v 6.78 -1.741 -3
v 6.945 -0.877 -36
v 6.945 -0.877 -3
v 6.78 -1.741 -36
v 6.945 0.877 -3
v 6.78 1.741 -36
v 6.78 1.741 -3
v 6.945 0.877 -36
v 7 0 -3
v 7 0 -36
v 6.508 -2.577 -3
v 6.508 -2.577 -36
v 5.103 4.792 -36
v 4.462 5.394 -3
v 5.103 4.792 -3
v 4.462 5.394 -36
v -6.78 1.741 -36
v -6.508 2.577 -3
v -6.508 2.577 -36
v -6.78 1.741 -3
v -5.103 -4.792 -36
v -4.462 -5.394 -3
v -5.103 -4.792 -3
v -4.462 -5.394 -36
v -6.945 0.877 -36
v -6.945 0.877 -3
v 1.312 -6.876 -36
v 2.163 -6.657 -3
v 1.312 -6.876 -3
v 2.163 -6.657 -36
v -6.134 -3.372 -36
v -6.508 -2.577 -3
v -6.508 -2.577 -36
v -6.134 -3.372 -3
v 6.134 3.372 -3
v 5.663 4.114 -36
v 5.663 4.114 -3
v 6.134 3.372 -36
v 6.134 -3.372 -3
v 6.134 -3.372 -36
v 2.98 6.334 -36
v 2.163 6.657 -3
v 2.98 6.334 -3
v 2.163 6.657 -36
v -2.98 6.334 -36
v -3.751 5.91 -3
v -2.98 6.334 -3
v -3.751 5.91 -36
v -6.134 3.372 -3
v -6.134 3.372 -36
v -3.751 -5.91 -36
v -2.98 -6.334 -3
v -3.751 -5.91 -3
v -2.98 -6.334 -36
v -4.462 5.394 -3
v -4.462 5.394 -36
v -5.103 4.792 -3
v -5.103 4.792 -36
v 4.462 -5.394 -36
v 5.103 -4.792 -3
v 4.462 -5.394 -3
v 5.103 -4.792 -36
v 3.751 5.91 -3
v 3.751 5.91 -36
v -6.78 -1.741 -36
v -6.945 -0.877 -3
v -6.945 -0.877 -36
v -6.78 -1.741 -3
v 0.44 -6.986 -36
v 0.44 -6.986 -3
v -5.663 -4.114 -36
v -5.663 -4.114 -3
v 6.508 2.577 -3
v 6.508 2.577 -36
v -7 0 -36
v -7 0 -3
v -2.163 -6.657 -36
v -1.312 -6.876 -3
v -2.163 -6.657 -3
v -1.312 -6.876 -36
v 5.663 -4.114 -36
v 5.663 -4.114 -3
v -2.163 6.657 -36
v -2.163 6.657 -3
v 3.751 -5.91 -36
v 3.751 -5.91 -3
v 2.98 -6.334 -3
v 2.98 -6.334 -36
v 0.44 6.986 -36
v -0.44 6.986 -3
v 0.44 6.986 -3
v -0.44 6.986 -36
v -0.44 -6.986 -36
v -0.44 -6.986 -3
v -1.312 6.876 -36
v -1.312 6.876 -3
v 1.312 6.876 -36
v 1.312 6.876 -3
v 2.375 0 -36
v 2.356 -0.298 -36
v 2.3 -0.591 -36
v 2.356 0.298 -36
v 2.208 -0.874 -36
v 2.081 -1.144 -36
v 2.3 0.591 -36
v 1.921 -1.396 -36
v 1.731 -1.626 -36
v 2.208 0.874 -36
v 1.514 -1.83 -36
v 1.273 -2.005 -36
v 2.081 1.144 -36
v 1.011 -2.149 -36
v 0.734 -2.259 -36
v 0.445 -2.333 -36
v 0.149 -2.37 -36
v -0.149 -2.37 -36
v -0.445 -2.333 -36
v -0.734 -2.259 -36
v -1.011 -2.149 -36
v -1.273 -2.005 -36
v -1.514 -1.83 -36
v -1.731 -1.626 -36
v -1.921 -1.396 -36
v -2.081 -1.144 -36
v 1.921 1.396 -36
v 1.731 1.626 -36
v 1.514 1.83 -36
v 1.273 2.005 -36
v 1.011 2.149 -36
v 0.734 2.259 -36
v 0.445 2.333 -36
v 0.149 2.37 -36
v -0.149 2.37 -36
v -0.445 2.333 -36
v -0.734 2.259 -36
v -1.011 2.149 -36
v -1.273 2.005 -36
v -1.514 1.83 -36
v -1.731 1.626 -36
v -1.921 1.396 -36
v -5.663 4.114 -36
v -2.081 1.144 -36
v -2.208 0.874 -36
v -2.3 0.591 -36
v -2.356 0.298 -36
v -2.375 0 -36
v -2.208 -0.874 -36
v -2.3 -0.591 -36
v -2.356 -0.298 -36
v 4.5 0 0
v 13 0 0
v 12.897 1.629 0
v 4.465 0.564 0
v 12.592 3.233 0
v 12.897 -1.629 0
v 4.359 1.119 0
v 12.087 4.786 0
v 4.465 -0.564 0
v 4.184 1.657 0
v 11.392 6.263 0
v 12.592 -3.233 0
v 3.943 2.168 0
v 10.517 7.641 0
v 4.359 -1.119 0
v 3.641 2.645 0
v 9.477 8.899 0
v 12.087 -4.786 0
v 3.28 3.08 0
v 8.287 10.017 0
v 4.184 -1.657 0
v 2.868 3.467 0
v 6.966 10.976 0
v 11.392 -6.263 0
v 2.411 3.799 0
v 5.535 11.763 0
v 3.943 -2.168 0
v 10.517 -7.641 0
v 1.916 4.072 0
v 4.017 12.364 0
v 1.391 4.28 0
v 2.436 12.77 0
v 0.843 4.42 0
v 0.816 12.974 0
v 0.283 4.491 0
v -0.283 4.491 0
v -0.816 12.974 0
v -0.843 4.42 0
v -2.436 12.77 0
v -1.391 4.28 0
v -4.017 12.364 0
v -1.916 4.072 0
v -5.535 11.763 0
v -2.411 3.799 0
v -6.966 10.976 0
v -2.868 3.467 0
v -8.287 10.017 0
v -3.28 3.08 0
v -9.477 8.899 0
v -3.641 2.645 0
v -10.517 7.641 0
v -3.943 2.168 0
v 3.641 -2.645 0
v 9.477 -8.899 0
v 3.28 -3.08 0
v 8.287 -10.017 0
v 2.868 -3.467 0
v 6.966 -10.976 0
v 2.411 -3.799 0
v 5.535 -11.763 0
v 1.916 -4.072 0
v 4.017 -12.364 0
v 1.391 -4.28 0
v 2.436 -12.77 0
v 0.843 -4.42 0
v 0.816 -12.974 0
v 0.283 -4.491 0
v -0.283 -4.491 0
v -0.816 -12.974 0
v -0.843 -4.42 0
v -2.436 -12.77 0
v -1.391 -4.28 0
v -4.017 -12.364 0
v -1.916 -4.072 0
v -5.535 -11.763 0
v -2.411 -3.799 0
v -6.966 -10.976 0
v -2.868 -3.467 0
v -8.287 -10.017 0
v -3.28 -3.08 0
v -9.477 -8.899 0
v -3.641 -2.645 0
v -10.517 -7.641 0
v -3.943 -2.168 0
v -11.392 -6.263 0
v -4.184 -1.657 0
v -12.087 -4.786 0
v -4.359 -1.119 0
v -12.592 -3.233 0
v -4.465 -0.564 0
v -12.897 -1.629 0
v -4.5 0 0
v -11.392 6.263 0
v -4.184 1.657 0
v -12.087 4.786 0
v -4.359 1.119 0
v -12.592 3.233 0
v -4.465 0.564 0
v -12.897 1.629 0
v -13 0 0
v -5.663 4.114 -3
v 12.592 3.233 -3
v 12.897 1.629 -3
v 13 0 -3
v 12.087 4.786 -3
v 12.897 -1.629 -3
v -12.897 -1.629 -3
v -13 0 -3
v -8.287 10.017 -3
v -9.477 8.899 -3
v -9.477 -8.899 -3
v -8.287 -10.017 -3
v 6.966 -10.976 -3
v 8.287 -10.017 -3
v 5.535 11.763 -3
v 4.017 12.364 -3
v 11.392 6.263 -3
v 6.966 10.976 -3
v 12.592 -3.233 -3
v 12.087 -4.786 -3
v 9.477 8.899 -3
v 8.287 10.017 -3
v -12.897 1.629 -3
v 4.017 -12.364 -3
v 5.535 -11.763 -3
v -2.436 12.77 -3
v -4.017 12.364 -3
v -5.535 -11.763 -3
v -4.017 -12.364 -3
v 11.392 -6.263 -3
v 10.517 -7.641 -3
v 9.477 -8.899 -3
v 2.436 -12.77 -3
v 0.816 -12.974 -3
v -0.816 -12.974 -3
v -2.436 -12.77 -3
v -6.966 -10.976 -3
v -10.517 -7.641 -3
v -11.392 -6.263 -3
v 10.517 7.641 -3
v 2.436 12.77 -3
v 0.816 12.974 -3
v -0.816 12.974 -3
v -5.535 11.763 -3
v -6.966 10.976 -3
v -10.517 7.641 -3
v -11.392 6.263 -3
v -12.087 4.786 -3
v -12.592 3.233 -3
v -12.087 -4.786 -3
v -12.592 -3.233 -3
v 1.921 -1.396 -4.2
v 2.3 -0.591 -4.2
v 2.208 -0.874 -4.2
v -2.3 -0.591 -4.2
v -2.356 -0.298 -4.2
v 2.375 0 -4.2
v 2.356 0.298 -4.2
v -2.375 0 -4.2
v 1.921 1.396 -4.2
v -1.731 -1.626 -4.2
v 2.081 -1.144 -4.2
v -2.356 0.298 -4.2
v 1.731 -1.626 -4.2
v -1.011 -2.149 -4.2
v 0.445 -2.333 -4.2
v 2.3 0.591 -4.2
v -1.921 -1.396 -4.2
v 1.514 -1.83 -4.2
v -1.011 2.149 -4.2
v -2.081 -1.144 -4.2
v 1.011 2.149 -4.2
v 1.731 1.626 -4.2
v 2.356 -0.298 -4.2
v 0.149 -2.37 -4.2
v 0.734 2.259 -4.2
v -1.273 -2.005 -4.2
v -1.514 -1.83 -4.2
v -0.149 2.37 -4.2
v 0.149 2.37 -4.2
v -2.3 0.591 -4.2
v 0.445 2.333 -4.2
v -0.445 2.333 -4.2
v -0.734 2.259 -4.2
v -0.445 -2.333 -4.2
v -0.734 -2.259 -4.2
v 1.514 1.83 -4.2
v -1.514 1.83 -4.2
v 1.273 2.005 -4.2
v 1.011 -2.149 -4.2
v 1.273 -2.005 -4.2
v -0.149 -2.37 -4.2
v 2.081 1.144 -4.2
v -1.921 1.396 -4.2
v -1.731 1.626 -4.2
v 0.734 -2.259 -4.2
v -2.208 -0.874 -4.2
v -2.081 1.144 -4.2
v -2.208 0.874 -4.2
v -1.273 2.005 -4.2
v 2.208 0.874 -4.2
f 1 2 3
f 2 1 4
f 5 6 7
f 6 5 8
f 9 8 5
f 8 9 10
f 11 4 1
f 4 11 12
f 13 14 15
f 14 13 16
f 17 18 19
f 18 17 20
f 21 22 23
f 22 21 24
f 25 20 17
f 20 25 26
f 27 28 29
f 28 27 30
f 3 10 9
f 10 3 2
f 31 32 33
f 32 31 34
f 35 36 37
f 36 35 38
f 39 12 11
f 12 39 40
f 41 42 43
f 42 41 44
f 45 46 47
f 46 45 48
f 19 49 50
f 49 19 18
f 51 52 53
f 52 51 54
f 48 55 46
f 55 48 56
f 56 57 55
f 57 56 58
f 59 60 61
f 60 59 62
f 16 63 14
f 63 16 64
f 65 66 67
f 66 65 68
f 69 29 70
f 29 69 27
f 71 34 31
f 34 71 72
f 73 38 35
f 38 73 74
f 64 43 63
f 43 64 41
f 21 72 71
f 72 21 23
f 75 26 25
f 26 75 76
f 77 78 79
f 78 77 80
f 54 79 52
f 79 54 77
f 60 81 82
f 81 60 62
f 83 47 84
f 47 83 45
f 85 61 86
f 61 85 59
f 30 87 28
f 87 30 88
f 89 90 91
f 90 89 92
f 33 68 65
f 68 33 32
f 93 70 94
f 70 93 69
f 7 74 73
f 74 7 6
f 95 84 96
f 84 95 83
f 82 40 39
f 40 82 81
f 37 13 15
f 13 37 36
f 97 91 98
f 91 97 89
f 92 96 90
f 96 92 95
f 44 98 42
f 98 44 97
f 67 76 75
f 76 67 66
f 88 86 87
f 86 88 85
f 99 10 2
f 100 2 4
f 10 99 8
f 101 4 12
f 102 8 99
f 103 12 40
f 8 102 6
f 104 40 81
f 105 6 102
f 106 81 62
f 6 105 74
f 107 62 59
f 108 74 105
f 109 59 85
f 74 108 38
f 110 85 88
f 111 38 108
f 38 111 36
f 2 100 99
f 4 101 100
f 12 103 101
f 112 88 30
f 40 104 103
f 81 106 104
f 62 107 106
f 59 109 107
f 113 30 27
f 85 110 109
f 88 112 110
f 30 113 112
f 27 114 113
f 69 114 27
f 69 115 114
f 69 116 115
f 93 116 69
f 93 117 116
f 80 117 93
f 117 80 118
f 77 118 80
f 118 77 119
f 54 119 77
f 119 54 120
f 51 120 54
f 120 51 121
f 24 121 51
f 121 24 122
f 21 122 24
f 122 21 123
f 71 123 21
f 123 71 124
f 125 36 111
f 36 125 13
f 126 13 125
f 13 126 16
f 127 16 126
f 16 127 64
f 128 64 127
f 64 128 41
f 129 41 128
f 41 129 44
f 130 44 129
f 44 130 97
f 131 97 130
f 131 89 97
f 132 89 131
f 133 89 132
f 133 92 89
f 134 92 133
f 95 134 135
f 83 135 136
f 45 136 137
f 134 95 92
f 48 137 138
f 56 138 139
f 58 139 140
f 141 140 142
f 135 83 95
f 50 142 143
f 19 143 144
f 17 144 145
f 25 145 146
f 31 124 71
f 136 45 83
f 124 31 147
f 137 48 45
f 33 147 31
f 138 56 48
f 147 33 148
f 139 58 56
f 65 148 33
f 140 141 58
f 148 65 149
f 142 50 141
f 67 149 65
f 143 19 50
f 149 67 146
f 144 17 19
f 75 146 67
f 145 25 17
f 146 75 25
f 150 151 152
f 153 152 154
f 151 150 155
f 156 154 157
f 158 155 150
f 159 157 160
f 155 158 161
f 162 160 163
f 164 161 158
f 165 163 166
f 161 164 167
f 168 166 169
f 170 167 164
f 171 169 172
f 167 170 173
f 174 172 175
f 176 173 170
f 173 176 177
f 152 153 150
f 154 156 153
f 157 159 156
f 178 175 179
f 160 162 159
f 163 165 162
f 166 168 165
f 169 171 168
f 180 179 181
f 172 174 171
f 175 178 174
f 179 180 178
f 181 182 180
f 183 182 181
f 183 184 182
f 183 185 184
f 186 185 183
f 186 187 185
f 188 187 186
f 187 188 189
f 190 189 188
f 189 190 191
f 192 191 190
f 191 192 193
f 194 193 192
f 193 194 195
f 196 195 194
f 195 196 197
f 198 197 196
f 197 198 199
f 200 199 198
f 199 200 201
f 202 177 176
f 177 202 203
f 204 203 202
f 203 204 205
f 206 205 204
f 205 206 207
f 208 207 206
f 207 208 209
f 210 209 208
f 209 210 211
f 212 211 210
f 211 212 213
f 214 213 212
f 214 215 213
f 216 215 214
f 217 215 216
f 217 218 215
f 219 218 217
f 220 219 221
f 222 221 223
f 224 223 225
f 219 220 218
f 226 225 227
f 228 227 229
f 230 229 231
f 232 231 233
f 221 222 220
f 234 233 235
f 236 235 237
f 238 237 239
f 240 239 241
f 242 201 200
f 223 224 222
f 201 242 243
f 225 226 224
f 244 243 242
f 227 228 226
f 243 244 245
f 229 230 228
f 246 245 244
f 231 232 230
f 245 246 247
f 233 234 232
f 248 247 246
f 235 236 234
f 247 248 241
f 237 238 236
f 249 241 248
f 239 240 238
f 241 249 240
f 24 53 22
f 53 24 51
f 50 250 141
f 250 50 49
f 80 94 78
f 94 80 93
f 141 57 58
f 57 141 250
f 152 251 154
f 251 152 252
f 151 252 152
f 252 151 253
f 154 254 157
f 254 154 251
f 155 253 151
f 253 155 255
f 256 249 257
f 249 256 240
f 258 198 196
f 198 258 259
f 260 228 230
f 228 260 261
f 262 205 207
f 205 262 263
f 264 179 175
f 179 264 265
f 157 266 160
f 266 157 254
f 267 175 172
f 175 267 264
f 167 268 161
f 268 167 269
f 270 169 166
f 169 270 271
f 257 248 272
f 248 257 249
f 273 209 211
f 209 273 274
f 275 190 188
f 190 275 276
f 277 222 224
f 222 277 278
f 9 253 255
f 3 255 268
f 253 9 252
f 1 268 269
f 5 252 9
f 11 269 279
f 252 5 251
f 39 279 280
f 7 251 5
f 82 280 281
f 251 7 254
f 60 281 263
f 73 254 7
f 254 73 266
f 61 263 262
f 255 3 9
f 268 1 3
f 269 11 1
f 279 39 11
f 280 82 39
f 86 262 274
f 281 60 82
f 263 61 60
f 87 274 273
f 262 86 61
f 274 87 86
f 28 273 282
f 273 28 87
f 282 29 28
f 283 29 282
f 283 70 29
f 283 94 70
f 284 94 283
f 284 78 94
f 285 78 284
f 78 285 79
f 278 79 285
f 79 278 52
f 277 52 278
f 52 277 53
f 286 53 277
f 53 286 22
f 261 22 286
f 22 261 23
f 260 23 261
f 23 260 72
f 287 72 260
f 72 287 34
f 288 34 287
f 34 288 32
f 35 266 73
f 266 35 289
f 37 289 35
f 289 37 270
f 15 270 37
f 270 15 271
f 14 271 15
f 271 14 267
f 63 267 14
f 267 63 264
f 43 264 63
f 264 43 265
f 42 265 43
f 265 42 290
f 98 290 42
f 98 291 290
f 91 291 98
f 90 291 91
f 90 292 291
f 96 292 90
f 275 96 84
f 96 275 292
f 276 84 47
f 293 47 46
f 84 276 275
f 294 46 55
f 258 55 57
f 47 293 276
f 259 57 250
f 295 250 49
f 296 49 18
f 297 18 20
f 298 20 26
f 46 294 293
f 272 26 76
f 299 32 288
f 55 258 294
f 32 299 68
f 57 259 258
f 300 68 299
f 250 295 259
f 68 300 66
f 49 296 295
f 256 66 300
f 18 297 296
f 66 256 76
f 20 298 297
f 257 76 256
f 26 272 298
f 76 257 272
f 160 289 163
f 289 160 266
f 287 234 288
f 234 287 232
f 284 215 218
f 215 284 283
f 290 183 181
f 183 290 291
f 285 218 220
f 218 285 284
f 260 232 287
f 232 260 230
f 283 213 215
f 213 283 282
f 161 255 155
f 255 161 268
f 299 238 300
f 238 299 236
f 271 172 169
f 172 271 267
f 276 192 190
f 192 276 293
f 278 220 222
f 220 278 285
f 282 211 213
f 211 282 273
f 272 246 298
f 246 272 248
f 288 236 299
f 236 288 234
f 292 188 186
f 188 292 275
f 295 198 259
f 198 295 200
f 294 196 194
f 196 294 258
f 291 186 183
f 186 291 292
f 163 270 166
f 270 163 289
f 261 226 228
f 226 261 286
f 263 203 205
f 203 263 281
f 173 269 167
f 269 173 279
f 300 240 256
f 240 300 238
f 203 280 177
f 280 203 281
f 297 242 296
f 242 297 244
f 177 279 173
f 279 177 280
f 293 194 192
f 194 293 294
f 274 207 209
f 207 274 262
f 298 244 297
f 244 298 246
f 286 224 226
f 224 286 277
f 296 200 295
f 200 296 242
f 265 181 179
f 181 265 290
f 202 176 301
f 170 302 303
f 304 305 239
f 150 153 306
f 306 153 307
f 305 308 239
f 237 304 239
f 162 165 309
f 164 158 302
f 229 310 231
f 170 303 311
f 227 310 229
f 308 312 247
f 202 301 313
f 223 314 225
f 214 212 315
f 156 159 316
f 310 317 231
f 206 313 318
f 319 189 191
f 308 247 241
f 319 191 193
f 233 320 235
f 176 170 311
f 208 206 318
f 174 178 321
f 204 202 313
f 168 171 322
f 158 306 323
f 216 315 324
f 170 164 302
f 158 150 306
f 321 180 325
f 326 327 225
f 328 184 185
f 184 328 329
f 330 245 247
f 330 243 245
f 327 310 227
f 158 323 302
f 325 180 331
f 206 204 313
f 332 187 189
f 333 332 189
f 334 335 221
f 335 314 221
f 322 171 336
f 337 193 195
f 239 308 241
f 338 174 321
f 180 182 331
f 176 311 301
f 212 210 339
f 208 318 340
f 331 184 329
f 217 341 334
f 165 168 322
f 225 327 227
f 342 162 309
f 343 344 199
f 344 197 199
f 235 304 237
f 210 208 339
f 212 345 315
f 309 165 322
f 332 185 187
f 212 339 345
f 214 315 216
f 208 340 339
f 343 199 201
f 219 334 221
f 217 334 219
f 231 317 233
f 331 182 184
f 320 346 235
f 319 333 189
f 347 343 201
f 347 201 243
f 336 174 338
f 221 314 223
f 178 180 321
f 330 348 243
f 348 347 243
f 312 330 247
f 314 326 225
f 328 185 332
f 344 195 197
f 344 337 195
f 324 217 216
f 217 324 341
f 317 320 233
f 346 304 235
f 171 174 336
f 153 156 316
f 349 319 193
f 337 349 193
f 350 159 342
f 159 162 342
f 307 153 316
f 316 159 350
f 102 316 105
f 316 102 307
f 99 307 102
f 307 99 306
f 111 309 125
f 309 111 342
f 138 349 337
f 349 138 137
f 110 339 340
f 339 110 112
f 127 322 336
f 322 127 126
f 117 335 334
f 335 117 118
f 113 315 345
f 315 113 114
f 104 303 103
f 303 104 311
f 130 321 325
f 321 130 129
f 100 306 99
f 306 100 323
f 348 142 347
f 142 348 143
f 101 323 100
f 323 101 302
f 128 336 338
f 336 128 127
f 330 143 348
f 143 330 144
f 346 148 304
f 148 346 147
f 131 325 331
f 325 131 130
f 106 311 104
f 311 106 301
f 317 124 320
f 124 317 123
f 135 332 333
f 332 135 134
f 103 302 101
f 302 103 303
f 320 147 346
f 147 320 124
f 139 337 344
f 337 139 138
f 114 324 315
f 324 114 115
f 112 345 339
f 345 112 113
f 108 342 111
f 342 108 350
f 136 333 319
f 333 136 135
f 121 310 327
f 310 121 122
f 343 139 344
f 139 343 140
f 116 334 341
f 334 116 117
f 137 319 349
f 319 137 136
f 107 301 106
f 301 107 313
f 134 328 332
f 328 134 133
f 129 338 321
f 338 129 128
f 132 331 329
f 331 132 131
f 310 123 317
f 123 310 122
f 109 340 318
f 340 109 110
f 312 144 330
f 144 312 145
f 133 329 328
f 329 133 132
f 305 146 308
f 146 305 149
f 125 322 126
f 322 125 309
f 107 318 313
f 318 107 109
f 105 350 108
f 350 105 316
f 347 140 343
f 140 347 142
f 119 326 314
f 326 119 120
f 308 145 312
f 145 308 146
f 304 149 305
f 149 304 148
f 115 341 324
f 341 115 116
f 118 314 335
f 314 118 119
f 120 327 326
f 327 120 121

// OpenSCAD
$fn = 50;


difference() {
	union() {
		translate(v = [0, 0, -36.0000000000]) {
			cylinder(h = 36, r = 7.0000000000);
		}
		translate(v = [0, 0, -3.0000000000]) {
			cylinder(h = 3, r = 13.0000000000);
		}
	}
	union() {
		translate(v = [0, 0, 0]) {
			rotate(a = [0, 0, 0]) {
				difference() {
					union() {
						#translate(v = [0, 0, -36.0000000000]) {
							cylinder(h = 36, r = 2.2500000000);
						}
						#translate(v = [0, 0, -4.2000000000]) {
							cylinder(h = 4.2000000000, r = 7.0000000000, r1 = 2.3750000000, r2 = 4.5000000000);
						}
						#translate(v = [0, 0, -36.0000000000]) {
							cylinder(h = 36, r = 2.3750000000);
						}
						#translate(v = [0, 0, -36.0000000000]) {
							cylinder(h = 36, r = 2.2500000000);
						}
					}
					union();
				}
			}
		}
	}
}
